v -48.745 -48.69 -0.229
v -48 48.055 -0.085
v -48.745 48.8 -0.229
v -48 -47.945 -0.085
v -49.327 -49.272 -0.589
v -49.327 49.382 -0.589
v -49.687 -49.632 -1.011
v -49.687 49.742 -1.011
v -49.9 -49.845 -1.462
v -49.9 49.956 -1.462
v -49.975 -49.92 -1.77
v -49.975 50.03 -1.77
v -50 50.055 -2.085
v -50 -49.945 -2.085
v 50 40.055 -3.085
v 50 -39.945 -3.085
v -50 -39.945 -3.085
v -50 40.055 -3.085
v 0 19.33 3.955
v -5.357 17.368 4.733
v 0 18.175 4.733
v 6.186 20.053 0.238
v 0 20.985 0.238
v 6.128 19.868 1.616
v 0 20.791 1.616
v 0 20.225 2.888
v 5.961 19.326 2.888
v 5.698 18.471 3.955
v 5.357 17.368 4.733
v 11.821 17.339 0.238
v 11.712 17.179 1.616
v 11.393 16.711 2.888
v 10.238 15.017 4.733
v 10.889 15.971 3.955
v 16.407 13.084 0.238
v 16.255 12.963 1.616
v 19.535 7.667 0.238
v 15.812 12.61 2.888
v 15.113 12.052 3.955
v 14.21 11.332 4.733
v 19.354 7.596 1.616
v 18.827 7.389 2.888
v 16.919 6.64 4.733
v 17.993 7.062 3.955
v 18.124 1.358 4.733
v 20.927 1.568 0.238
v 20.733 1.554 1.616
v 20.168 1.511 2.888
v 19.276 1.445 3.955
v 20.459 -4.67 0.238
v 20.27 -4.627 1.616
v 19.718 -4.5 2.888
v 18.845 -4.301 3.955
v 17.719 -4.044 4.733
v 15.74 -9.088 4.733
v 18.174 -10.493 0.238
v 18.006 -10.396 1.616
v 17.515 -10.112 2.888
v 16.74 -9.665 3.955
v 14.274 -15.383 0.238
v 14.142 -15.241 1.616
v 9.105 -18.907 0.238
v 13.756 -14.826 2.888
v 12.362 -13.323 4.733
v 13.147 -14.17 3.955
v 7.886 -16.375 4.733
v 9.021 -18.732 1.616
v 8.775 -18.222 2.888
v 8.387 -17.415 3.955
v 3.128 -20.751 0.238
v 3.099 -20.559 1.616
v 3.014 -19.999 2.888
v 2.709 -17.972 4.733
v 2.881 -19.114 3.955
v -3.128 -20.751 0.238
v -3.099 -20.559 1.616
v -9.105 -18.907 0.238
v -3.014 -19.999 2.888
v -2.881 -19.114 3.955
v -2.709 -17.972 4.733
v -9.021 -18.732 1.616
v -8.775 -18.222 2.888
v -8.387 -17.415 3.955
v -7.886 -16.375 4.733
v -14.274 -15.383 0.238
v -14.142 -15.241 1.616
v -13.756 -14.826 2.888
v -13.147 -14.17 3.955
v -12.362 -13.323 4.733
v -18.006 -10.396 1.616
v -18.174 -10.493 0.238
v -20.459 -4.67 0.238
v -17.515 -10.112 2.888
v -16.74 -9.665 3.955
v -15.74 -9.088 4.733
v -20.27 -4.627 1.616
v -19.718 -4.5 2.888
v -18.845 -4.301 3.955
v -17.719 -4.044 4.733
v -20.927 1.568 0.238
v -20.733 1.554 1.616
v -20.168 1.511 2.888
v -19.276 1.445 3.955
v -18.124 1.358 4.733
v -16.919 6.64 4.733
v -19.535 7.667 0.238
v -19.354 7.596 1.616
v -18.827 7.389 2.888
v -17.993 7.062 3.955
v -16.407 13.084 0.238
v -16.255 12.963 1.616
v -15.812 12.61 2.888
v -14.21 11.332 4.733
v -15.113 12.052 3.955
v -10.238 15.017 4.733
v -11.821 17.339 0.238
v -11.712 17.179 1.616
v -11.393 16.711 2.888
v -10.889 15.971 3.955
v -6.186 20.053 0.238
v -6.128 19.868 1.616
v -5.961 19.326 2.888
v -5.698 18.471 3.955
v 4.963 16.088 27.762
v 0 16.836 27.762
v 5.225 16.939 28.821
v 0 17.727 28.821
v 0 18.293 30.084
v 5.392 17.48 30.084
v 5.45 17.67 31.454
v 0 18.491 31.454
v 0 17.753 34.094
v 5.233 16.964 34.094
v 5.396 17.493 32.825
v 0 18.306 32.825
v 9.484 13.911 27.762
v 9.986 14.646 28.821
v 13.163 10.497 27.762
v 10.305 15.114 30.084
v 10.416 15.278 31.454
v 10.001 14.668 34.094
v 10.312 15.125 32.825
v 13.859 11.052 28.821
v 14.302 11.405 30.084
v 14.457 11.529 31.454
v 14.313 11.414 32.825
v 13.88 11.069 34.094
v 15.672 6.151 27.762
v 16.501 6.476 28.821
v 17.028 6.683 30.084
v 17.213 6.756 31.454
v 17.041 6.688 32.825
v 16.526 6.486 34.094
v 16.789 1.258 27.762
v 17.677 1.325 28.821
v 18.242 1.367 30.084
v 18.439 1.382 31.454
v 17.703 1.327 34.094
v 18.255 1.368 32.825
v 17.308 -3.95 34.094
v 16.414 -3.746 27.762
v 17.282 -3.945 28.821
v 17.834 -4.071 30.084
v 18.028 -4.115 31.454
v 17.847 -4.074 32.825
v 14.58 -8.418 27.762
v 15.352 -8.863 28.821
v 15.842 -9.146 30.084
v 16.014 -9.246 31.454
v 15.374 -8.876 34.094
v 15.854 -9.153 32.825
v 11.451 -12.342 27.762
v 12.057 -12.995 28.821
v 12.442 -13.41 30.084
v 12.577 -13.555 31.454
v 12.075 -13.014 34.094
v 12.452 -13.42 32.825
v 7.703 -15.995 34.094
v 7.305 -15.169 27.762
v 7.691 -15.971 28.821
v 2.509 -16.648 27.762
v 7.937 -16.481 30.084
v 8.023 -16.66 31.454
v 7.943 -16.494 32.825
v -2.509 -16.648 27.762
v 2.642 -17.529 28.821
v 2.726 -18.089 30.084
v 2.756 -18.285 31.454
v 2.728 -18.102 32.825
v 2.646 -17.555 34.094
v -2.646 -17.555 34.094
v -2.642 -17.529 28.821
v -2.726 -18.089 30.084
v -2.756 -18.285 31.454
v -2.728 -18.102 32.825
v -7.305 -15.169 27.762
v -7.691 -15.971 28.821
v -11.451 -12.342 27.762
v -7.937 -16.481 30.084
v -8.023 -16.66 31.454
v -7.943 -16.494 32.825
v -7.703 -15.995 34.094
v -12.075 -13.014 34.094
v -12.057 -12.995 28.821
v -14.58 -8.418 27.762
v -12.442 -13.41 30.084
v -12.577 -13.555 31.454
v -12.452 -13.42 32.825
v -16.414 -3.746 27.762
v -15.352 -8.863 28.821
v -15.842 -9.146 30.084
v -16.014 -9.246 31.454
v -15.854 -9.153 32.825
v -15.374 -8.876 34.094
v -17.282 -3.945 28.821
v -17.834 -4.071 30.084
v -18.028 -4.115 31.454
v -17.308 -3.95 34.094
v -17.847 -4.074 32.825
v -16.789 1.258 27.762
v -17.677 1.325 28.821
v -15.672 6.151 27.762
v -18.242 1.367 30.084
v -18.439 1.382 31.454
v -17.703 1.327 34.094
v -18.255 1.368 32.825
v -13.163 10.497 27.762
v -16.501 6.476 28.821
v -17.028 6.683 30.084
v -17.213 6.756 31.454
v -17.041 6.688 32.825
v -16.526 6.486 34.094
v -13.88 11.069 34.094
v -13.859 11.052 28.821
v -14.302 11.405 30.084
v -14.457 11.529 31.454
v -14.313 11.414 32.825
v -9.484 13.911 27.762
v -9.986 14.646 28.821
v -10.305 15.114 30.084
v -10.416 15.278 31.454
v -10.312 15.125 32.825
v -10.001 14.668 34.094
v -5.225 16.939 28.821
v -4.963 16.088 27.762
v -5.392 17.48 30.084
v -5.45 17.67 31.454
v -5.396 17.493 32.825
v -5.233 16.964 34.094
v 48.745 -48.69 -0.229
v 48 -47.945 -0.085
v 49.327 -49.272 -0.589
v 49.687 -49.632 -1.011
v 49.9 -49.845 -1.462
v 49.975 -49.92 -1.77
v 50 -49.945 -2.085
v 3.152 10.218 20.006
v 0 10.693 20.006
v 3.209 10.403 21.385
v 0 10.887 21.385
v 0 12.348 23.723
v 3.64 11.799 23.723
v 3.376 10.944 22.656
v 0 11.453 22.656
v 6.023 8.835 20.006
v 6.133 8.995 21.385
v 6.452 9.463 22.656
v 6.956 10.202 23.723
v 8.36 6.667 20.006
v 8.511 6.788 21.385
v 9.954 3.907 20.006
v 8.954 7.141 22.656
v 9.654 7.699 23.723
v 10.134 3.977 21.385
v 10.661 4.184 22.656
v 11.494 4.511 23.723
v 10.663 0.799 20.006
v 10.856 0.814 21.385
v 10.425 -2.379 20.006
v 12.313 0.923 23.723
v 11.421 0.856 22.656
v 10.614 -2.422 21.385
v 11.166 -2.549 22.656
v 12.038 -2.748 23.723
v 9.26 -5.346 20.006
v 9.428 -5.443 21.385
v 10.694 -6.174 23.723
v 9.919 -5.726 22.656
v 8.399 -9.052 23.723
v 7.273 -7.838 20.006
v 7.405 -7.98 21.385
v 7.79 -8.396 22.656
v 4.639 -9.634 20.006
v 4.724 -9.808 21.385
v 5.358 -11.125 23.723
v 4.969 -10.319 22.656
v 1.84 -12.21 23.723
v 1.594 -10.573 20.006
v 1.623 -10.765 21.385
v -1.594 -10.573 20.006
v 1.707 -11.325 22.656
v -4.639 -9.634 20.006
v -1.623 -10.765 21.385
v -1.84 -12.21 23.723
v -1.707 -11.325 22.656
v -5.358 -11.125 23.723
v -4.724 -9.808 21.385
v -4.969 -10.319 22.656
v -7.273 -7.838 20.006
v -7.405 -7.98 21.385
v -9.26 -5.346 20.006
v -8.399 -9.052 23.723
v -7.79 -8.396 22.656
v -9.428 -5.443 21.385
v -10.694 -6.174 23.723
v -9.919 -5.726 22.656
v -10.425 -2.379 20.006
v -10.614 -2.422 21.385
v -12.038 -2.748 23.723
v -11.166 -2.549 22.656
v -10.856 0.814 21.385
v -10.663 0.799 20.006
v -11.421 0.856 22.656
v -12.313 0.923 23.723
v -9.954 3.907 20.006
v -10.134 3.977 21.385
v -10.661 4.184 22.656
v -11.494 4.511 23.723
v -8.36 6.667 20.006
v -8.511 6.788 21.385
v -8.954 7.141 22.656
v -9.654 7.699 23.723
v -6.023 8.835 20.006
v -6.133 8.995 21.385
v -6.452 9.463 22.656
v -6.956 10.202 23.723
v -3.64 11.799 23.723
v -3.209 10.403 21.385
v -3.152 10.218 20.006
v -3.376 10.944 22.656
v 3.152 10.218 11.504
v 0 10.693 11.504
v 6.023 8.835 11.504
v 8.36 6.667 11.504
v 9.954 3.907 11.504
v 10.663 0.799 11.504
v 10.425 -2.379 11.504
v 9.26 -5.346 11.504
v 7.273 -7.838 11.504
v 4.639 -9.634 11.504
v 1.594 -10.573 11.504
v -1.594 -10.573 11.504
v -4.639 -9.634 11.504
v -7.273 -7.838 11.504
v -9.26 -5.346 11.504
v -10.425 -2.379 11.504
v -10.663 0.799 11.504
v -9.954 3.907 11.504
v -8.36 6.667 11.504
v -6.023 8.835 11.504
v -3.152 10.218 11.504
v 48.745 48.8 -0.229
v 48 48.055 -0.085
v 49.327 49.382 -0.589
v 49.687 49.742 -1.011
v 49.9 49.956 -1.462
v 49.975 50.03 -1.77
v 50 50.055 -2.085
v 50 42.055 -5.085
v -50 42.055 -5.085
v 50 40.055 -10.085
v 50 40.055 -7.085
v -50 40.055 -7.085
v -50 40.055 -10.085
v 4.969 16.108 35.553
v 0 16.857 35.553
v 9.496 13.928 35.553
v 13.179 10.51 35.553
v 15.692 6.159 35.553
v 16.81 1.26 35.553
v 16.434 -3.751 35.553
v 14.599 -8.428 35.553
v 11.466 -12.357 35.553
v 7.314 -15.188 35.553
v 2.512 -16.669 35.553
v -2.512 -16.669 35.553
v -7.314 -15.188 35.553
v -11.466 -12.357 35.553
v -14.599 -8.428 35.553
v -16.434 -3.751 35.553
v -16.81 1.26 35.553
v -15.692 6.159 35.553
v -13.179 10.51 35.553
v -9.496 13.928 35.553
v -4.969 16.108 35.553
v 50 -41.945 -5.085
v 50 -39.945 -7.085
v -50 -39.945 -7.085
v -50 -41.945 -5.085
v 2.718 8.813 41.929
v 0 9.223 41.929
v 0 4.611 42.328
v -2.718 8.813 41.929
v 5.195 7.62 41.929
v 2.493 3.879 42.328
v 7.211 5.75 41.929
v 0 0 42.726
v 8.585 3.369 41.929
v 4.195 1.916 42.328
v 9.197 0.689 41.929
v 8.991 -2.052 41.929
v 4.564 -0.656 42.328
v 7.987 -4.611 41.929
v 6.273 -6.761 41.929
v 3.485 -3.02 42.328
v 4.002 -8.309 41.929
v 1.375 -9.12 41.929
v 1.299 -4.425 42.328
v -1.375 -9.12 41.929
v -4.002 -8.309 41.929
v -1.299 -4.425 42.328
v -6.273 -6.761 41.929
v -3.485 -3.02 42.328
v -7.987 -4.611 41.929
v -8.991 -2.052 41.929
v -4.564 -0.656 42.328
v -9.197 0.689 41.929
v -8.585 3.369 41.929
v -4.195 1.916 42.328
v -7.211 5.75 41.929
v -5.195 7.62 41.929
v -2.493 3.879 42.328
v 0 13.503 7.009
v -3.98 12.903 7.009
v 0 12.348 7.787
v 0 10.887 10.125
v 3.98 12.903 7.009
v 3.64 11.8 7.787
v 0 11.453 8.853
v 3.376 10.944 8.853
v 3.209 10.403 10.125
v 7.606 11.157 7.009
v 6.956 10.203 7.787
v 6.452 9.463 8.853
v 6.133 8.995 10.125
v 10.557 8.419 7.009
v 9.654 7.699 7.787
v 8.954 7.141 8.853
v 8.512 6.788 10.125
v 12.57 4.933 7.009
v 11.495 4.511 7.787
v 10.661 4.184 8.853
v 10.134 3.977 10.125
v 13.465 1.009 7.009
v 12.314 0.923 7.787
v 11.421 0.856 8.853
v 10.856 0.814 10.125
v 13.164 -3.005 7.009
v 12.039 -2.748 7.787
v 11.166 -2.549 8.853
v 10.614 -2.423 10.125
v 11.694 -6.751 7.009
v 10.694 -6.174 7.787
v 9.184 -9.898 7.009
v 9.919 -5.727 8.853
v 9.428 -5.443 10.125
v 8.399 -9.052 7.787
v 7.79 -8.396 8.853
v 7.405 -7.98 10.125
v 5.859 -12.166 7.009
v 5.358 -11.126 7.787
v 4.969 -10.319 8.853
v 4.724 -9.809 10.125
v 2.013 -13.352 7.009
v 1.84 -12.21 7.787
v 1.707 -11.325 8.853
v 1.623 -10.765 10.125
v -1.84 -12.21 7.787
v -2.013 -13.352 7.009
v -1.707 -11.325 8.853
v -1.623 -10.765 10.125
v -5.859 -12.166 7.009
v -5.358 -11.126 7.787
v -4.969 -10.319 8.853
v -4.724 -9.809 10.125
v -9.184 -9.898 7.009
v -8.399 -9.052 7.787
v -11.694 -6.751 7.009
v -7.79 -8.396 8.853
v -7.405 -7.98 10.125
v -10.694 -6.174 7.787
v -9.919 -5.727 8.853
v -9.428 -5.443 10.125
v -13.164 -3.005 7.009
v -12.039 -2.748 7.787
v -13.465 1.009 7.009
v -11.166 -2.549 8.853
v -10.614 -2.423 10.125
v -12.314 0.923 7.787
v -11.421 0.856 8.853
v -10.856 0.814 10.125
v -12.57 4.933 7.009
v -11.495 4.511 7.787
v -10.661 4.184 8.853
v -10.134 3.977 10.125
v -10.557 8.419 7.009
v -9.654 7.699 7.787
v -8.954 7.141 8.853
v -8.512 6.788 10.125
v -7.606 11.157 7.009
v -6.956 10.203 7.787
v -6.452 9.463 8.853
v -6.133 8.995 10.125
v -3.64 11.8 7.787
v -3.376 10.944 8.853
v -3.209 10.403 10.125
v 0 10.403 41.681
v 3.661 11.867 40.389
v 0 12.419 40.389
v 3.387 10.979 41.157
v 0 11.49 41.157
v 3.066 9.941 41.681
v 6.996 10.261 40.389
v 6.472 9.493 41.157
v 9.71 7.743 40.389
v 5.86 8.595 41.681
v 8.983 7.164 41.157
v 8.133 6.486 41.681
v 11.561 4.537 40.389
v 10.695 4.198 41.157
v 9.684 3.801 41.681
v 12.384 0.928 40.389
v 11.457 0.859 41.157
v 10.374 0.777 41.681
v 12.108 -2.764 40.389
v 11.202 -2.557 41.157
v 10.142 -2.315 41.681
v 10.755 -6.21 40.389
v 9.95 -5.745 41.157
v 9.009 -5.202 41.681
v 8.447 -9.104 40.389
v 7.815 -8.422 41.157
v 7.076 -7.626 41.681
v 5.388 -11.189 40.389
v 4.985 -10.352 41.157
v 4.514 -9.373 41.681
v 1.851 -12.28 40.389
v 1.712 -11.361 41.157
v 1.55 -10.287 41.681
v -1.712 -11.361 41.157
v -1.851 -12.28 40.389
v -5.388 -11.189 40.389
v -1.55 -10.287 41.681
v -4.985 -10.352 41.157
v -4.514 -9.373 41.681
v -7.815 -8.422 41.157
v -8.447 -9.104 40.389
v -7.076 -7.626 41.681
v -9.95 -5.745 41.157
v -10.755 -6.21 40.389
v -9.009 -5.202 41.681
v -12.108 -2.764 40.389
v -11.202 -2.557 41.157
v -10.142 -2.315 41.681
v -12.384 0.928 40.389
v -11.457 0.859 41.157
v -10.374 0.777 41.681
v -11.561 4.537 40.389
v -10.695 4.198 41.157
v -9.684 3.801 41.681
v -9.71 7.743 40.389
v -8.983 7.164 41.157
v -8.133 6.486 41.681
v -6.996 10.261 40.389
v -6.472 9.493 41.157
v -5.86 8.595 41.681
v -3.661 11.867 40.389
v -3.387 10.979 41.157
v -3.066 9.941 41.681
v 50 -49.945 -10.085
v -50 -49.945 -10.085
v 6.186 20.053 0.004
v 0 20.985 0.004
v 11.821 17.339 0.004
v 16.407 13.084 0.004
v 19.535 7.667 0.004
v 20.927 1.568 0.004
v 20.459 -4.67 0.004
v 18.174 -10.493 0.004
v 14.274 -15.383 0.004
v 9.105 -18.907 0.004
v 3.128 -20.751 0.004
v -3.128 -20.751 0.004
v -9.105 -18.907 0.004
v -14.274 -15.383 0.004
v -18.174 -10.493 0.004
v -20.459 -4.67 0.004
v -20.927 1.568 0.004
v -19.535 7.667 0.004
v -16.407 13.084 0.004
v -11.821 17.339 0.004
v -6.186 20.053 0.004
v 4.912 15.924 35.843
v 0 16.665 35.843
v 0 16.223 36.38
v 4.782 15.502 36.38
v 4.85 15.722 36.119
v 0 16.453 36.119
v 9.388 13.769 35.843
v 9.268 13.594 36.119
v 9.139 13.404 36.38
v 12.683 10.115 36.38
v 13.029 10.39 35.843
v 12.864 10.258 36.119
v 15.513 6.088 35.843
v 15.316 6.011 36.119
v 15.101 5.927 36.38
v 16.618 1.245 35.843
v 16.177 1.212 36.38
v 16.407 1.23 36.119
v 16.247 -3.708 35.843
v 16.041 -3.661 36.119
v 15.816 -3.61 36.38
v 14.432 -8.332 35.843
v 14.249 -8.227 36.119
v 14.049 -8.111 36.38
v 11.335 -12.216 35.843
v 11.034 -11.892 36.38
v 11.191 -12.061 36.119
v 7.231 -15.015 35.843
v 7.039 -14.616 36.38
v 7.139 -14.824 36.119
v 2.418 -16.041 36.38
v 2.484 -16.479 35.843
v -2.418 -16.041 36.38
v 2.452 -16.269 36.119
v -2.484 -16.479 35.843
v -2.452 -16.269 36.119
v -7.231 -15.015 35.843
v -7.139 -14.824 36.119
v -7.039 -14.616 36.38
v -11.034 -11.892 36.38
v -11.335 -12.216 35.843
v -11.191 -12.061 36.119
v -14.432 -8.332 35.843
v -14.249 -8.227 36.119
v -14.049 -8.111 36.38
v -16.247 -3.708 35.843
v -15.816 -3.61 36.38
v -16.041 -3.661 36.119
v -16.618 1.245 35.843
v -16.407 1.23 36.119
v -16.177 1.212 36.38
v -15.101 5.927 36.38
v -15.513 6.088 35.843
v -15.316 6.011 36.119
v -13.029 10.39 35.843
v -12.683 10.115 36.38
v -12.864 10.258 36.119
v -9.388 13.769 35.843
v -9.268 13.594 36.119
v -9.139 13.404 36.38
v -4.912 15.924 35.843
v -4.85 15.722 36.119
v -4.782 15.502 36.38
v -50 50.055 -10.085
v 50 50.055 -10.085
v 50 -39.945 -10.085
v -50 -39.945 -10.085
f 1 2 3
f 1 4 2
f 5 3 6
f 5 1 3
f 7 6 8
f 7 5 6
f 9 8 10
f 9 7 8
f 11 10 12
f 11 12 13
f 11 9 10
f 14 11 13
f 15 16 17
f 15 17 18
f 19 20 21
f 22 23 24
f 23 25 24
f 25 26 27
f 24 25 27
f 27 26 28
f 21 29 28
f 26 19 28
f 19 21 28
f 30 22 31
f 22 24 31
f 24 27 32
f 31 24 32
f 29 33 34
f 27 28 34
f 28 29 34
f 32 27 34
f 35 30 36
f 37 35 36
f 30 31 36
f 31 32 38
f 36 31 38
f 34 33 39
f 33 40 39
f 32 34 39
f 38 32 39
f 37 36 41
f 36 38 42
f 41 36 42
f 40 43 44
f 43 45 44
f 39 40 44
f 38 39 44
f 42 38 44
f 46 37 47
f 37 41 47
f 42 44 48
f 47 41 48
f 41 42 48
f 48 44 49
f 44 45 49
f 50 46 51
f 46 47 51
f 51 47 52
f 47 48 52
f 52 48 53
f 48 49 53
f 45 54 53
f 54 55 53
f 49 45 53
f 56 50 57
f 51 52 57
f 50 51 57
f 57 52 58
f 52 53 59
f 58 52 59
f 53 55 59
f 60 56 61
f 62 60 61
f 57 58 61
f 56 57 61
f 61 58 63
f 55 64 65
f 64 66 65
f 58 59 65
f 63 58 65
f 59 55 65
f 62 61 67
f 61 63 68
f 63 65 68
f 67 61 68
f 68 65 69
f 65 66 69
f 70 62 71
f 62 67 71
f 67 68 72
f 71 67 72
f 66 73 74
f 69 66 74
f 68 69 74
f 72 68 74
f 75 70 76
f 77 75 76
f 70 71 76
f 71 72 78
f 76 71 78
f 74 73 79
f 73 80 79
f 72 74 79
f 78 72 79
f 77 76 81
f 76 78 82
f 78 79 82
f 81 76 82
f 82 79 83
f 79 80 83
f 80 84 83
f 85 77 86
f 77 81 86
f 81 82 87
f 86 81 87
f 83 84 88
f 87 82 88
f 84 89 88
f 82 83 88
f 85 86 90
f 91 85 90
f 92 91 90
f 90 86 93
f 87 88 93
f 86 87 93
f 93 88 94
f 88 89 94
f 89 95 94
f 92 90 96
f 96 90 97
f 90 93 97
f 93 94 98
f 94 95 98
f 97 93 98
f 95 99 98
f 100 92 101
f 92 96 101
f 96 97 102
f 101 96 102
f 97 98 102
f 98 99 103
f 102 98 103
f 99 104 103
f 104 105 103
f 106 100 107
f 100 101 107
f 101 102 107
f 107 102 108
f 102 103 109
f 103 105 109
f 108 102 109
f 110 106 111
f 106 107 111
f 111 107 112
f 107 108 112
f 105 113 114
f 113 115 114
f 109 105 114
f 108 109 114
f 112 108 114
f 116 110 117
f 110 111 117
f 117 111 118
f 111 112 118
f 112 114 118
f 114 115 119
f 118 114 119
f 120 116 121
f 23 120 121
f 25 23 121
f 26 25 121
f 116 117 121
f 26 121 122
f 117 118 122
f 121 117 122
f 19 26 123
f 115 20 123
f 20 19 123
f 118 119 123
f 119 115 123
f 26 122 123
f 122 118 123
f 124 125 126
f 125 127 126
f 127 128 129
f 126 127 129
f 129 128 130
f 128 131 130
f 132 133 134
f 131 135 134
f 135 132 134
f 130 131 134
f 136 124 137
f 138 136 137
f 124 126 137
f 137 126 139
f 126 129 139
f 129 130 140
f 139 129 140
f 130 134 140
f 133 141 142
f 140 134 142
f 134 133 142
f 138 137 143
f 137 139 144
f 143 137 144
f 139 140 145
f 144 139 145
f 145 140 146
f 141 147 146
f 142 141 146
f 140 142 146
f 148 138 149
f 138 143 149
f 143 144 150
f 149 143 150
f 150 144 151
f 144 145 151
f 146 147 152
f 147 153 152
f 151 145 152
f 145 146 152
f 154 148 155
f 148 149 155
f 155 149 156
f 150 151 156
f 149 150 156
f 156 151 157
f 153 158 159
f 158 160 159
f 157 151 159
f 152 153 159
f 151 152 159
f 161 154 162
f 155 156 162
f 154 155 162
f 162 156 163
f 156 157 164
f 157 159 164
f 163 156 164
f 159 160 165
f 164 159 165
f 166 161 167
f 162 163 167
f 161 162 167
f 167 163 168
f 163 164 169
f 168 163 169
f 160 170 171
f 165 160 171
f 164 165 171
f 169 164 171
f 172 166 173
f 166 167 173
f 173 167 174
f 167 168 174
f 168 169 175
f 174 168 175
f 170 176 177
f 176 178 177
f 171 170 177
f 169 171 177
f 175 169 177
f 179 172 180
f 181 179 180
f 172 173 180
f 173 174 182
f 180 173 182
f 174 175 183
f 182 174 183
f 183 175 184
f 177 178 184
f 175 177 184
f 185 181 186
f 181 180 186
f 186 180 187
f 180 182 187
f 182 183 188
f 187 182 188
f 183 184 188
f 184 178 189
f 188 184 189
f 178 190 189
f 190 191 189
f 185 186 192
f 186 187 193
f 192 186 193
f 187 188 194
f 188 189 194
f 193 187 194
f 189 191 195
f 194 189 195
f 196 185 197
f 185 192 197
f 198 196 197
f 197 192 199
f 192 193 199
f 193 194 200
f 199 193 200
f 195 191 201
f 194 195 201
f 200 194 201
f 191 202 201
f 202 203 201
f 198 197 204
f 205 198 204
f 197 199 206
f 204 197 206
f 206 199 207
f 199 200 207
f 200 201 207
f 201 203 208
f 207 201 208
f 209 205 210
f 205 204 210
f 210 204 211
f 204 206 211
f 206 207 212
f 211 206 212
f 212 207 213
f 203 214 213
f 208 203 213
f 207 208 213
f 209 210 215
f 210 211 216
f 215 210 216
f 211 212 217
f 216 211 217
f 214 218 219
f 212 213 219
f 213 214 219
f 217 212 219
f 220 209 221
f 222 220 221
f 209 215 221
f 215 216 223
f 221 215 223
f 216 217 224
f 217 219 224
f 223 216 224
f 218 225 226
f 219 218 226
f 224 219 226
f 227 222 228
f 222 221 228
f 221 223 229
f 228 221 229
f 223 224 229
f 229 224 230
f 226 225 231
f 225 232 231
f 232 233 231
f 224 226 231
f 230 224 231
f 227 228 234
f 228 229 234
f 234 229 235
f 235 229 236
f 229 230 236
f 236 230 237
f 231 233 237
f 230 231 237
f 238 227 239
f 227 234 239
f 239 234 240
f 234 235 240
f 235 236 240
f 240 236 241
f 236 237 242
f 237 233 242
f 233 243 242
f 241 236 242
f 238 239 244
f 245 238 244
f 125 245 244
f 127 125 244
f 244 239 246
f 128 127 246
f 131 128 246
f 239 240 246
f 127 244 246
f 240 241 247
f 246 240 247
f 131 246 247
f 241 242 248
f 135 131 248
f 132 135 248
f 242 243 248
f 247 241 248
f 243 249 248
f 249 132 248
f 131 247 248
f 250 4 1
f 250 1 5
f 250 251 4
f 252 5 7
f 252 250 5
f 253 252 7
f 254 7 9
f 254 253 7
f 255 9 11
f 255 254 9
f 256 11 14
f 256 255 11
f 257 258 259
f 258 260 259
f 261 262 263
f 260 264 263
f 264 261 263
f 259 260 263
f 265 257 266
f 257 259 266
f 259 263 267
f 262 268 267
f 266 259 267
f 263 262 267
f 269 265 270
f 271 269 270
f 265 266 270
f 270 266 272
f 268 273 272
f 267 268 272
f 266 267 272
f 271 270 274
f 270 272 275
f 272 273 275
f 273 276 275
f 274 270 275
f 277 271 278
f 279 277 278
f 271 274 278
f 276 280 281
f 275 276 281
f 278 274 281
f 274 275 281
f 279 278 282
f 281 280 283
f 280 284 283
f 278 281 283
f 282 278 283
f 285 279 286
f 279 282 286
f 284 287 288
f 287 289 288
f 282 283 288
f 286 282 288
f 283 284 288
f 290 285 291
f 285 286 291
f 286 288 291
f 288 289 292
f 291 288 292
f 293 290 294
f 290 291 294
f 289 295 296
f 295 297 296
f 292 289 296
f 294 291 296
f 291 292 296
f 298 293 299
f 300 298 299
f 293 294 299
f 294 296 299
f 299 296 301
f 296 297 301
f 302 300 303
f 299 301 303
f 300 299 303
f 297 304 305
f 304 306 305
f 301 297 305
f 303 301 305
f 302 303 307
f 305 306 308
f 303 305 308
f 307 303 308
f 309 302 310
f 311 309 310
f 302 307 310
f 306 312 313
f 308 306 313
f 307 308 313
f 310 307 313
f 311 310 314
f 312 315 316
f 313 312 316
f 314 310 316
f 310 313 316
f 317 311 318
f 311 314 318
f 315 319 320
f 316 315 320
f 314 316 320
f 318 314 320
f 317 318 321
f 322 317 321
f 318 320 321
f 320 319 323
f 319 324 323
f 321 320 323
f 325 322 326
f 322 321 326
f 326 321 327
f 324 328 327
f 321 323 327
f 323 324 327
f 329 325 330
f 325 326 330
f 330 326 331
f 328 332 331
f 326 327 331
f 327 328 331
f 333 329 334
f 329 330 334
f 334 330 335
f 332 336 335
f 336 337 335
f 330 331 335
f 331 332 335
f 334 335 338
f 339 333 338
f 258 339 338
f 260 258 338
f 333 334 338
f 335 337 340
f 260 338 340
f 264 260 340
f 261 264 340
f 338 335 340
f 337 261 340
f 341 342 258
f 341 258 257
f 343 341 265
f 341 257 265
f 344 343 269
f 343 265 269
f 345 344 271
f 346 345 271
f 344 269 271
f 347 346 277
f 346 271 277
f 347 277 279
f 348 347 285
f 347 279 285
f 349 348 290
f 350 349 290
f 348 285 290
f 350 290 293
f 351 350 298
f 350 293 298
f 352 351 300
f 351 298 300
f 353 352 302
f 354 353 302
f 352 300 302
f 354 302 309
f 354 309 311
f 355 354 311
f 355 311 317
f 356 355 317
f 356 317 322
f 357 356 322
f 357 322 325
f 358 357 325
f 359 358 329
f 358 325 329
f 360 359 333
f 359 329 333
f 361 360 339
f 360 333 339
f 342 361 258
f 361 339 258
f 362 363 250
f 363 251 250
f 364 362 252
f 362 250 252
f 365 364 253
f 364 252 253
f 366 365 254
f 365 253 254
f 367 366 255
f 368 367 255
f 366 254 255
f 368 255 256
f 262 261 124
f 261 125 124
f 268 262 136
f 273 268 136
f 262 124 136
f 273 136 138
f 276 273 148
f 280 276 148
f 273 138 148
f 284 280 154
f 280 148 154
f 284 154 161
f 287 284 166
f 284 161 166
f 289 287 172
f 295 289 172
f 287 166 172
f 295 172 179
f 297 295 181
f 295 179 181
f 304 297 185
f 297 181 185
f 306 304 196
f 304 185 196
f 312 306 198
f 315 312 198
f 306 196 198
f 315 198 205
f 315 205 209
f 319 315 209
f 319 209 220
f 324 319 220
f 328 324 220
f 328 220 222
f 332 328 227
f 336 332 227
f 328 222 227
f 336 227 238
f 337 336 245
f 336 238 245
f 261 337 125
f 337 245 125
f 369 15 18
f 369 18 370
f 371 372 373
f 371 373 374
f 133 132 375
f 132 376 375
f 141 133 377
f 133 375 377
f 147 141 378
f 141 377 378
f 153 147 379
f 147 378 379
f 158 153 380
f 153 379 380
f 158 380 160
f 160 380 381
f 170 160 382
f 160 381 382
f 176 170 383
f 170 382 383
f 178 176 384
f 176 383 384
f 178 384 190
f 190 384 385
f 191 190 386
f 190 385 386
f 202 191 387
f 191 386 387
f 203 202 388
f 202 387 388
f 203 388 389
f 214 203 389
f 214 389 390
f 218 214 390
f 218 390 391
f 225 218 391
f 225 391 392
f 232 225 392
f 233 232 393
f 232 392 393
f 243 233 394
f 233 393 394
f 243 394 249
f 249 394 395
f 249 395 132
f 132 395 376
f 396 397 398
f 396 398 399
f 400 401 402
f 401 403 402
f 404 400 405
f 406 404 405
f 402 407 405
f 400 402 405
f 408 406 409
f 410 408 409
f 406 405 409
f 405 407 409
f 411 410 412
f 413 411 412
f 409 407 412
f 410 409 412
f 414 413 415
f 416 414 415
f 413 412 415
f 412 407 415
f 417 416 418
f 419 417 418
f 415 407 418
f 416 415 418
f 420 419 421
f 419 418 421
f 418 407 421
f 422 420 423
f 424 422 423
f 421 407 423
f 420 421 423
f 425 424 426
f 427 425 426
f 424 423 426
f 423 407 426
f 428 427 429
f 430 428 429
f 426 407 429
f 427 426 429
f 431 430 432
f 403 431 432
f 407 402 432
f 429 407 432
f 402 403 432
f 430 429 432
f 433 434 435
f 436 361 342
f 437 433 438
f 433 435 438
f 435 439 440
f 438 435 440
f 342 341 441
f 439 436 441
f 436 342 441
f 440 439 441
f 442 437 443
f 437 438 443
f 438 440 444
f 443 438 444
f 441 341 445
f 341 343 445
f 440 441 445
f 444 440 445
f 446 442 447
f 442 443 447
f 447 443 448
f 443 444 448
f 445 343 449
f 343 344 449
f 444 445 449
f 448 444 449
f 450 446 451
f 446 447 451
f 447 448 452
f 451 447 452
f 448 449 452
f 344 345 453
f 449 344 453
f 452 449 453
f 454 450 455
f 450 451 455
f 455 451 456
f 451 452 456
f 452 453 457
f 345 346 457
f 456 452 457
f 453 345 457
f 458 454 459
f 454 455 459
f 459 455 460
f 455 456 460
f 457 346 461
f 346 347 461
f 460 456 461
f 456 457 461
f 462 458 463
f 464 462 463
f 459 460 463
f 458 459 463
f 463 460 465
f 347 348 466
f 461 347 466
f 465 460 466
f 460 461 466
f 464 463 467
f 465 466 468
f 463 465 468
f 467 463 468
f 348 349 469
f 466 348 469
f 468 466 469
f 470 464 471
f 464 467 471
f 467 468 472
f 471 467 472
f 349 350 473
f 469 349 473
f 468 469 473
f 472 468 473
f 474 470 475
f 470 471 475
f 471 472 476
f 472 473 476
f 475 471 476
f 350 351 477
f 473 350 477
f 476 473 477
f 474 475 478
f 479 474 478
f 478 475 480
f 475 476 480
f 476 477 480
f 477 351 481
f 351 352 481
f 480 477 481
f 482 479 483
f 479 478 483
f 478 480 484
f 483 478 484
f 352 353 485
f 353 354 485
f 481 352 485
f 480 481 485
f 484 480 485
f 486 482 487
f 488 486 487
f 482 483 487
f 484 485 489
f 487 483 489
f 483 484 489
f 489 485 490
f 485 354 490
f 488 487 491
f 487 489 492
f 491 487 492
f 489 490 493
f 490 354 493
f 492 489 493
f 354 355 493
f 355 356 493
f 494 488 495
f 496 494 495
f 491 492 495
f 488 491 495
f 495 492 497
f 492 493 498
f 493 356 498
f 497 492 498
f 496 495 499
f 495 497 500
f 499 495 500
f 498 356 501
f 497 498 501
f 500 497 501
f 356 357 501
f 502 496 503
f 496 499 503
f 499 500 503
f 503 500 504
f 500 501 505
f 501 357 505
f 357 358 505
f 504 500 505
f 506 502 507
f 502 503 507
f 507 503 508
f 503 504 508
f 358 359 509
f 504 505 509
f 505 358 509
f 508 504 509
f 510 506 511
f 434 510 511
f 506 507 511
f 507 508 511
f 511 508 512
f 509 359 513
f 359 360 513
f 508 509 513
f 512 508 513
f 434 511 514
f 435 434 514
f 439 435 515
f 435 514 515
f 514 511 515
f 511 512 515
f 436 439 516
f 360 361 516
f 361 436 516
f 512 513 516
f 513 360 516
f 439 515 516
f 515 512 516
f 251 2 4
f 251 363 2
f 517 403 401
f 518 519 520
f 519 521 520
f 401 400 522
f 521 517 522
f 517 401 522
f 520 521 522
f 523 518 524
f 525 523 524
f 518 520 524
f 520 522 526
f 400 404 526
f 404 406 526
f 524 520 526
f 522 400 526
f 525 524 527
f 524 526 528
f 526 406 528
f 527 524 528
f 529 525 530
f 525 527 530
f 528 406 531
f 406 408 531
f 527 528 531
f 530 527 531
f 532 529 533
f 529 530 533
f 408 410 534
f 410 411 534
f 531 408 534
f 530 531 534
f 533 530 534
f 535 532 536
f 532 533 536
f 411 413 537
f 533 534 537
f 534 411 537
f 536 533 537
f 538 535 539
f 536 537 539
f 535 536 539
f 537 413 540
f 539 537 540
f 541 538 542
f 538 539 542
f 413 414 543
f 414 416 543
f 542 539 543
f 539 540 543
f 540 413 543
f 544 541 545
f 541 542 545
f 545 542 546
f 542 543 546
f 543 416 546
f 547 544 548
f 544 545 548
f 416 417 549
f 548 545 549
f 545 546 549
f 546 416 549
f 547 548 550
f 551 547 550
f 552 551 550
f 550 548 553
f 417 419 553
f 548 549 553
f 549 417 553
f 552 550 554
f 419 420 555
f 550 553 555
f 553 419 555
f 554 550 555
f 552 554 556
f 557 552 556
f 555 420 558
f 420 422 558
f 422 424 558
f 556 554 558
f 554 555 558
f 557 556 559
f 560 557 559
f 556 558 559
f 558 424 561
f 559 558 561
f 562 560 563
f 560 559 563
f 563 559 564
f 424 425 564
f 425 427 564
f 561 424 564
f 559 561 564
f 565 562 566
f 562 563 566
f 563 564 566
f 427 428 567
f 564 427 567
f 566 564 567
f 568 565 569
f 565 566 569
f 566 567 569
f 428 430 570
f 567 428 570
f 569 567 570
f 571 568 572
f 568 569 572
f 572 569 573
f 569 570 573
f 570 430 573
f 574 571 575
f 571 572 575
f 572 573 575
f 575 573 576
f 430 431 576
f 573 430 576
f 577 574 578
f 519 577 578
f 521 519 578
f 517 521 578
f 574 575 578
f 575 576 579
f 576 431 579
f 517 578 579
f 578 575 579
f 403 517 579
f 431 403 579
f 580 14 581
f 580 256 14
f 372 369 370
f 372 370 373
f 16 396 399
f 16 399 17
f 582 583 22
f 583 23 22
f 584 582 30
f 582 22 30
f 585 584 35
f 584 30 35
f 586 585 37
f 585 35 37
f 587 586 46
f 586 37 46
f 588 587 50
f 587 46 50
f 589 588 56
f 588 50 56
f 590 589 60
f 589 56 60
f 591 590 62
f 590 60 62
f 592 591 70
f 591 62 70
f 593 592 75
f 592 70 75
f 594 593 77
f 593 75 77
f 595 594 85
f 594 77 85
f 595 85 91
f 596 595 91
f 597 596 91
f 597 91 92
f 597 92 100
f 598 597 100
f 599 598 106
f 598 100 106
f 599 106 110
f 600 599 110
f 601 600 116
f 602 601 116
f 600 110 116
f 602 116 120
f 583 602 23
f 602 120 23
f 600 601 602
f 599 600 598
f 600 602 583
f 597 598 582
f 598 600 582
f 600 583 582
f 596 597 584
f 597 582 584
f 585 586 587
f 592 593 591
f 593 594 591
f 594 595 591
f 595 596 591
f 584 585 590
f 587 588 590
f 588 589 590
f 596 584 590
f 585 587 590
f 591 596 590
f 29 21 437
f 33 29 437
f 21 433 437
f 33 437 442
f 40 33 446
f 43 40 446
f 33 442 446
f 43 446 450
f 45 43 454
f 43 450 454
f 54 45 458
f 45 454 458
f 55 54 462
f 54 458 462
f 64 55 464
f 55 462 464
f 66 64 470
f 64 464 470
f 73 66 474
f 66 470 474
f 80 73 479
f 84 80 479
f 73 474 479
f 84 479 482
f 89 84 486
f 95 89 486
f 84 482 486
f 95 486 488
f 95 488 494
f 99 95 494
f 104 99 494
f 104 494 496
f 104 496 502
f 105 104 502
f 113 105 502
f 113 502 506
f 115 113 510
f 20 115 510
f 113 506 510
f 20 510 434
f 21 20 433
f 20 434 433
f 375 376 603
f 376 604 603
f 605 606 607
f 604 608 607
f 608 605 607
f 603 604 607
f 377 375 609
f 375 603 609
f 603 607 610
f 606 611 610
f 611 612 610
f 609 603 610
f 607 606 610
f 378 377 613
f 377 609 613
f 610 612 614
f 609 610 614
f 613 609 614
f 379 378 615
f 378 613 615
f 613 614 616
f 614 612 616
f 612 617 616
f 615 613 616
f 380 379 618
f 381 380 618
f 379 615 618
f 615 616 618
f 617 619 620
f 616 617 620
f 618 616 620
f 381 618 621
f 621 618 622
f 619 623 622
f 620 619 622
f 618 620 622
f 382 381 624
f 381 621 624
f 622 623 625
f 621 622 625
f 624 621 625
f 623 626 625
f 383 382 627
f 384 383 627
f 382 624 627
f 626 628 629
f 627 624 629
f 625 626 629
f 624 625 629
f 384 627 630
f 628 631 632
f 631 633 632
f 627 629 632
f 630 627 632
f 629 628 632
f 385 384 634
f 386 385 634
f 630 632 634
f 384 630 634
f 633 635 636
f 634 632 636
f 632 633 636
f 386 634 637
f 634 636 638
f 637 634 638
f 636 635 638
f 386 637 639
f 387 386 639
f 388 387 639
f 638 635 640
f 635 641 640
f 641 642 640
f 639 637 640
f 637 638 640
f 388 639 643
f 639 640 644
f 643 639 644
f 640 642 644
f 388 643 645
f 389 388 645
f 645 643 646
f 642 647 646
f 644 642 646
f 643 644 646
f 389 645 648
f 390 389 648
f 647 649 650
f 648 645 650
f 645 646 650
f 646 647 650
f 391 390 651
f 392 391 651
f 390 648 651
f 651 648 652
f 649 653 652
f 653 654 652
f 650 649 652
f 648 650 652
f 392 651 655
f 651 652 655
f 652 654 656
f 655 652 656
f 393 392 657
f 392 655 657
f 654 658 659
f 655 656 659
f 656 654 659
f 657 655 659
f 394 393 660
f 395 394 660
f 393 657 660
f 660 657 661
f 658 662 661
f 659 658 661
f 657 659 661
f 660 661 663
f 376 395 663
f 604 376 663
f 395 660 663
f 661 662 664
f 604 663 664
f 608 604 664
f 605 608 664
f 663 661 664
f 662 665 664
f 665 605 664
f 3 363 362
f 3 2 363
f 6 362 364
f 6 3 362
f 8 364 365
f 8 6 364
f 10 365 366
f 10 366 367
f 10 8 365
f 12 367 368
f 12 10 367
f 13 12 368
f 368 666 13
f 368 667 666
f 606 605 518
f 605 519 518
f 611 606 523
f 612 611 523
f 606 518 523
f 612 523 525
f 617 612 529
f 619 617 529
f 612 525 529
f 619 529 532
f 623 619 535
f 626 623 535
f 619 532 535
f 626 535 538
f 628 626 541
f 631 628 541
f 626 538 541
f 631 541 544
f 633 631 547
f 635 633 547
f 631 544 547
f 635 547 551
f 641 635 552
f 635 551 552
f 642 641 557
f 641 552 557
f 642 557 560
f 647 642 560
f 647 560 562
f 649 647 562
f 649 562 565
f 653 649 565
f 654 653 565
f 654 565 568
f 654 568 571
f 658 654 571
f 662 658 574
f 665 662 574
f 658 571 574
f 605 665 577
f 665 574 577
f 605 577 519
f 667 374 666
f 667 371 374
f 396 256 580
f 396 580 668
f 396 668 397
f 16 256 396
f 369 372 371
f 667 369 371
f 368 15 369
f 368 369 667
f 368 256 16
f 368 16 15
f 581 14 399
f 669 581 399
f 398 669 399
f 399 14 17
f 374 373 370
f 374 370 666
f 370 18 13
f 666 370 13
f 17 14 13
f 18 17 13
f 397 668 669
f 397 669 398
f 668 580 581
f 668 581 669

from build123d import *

# Parameters (mm, degrees)
F1_DEPTH = 50
F3_DEPTH = 50
F5_R     = 2


with BuildPart() as f1:
    # F0 (on Right) → F1 (new body)
    with BuildSketch(Plane.YZ):
        Polygon((50.055066, -0.085225), (-49.944934, -0.085225), (-49.944934, -10.085225), (-39.944934, -10.085225), (-39.944934, -7.085225), (-41.944934, -5.085225), (-39.944934, -3.085225), (40.055066, -3.085225), (42.055066, -5.085225), (40.055066, -7.085225), (40.055066, -10.085225), (50.055066, -10.085225), align=None)
    extrude(amount=F1_DEPTH)

    # F0 (on Right) → F3 (join)
    with BuildSketch(Plane.YZ):
        Polygon((50.055066, -0.085225), (-49.944934, -0.085225), (-49.944934, -10.085225), (-39.944934, -10.085225), (-39.944934, -7.085225), (-41.944934, -5.085225), (-39.944934, -3.085225), (40.055066, -3.085225), (42.055066, -5.085225), (40.055066, -7.085225), (40.055066, -10.085225), (50.055066, -10.085225), align=None)
    extrude(amount=-F3_DEPTH)

    # F5
    f5_edges = [f1.edges().sort_by_distance(p)[0] for p in [
        (-50, 0.055066, -0.085225),
        (0, -49.944934, -0.085225),
        (50, 0.055066, -0.085225),
        (0, 50.055066, -0.085225),
    ]]
    fillet(f5_edges, radius=F5_R)


with BuildPart() as f4:
    # F2 (on Right) → F4 (revolve)
    with BuildSketch(Plane.YZ):
        with BuildLine():
            Line((9.222665, 41.928775), (0, 42.726281))
            Line((0, 42.726281), (0, 0.003849))
            Line((0, 0.003849), (20.985238, 0.003849))
            Line((20.985238, 0.003849), (20.985238, 0.237737))
            ThreePointArc((20.985238, 0.237737), (20.224886, 2.888281), (18.175085, 4.732686))
            Line((18.175085, 4.732686), (13.502966, 7.008847))
            ThreePointArc((13.502966, 7.008847), (11.453165, 8.853253), (10.692813, 11.503796))
            Line((10.692813, 11.503796), (10.692813, 20.006272))
            ThreePointArc((10.692813, 20.006272), (11.125313, 22.040464), (12.347989, 23.722742))
            Line((12.347989, 23.722742), (16.836037, 27.761987))
            ThreePointArc((16.836037, 27.761987), (18.439608, 30.761946), (17.752826, 34.093539))
            Line((17.752826, 34.093539), (16.856958, 35.553471))
            ThreePointArc((16.856958, 35.553471), (16.561375, 35.983156), (16.222642, 36.379715))
            Line((16.222642, 36.379715), (12.419207, 40.38869))
            ThreePointArc((12.419207, 40.38869), (10.962143, 41.451817), (9.222665, 41.928775))
        make_face()
    revolve(axis=Axis((0, 0, 21.365065), (0, 0, -1)))


solid = Compound([f1.part, f4.part])
